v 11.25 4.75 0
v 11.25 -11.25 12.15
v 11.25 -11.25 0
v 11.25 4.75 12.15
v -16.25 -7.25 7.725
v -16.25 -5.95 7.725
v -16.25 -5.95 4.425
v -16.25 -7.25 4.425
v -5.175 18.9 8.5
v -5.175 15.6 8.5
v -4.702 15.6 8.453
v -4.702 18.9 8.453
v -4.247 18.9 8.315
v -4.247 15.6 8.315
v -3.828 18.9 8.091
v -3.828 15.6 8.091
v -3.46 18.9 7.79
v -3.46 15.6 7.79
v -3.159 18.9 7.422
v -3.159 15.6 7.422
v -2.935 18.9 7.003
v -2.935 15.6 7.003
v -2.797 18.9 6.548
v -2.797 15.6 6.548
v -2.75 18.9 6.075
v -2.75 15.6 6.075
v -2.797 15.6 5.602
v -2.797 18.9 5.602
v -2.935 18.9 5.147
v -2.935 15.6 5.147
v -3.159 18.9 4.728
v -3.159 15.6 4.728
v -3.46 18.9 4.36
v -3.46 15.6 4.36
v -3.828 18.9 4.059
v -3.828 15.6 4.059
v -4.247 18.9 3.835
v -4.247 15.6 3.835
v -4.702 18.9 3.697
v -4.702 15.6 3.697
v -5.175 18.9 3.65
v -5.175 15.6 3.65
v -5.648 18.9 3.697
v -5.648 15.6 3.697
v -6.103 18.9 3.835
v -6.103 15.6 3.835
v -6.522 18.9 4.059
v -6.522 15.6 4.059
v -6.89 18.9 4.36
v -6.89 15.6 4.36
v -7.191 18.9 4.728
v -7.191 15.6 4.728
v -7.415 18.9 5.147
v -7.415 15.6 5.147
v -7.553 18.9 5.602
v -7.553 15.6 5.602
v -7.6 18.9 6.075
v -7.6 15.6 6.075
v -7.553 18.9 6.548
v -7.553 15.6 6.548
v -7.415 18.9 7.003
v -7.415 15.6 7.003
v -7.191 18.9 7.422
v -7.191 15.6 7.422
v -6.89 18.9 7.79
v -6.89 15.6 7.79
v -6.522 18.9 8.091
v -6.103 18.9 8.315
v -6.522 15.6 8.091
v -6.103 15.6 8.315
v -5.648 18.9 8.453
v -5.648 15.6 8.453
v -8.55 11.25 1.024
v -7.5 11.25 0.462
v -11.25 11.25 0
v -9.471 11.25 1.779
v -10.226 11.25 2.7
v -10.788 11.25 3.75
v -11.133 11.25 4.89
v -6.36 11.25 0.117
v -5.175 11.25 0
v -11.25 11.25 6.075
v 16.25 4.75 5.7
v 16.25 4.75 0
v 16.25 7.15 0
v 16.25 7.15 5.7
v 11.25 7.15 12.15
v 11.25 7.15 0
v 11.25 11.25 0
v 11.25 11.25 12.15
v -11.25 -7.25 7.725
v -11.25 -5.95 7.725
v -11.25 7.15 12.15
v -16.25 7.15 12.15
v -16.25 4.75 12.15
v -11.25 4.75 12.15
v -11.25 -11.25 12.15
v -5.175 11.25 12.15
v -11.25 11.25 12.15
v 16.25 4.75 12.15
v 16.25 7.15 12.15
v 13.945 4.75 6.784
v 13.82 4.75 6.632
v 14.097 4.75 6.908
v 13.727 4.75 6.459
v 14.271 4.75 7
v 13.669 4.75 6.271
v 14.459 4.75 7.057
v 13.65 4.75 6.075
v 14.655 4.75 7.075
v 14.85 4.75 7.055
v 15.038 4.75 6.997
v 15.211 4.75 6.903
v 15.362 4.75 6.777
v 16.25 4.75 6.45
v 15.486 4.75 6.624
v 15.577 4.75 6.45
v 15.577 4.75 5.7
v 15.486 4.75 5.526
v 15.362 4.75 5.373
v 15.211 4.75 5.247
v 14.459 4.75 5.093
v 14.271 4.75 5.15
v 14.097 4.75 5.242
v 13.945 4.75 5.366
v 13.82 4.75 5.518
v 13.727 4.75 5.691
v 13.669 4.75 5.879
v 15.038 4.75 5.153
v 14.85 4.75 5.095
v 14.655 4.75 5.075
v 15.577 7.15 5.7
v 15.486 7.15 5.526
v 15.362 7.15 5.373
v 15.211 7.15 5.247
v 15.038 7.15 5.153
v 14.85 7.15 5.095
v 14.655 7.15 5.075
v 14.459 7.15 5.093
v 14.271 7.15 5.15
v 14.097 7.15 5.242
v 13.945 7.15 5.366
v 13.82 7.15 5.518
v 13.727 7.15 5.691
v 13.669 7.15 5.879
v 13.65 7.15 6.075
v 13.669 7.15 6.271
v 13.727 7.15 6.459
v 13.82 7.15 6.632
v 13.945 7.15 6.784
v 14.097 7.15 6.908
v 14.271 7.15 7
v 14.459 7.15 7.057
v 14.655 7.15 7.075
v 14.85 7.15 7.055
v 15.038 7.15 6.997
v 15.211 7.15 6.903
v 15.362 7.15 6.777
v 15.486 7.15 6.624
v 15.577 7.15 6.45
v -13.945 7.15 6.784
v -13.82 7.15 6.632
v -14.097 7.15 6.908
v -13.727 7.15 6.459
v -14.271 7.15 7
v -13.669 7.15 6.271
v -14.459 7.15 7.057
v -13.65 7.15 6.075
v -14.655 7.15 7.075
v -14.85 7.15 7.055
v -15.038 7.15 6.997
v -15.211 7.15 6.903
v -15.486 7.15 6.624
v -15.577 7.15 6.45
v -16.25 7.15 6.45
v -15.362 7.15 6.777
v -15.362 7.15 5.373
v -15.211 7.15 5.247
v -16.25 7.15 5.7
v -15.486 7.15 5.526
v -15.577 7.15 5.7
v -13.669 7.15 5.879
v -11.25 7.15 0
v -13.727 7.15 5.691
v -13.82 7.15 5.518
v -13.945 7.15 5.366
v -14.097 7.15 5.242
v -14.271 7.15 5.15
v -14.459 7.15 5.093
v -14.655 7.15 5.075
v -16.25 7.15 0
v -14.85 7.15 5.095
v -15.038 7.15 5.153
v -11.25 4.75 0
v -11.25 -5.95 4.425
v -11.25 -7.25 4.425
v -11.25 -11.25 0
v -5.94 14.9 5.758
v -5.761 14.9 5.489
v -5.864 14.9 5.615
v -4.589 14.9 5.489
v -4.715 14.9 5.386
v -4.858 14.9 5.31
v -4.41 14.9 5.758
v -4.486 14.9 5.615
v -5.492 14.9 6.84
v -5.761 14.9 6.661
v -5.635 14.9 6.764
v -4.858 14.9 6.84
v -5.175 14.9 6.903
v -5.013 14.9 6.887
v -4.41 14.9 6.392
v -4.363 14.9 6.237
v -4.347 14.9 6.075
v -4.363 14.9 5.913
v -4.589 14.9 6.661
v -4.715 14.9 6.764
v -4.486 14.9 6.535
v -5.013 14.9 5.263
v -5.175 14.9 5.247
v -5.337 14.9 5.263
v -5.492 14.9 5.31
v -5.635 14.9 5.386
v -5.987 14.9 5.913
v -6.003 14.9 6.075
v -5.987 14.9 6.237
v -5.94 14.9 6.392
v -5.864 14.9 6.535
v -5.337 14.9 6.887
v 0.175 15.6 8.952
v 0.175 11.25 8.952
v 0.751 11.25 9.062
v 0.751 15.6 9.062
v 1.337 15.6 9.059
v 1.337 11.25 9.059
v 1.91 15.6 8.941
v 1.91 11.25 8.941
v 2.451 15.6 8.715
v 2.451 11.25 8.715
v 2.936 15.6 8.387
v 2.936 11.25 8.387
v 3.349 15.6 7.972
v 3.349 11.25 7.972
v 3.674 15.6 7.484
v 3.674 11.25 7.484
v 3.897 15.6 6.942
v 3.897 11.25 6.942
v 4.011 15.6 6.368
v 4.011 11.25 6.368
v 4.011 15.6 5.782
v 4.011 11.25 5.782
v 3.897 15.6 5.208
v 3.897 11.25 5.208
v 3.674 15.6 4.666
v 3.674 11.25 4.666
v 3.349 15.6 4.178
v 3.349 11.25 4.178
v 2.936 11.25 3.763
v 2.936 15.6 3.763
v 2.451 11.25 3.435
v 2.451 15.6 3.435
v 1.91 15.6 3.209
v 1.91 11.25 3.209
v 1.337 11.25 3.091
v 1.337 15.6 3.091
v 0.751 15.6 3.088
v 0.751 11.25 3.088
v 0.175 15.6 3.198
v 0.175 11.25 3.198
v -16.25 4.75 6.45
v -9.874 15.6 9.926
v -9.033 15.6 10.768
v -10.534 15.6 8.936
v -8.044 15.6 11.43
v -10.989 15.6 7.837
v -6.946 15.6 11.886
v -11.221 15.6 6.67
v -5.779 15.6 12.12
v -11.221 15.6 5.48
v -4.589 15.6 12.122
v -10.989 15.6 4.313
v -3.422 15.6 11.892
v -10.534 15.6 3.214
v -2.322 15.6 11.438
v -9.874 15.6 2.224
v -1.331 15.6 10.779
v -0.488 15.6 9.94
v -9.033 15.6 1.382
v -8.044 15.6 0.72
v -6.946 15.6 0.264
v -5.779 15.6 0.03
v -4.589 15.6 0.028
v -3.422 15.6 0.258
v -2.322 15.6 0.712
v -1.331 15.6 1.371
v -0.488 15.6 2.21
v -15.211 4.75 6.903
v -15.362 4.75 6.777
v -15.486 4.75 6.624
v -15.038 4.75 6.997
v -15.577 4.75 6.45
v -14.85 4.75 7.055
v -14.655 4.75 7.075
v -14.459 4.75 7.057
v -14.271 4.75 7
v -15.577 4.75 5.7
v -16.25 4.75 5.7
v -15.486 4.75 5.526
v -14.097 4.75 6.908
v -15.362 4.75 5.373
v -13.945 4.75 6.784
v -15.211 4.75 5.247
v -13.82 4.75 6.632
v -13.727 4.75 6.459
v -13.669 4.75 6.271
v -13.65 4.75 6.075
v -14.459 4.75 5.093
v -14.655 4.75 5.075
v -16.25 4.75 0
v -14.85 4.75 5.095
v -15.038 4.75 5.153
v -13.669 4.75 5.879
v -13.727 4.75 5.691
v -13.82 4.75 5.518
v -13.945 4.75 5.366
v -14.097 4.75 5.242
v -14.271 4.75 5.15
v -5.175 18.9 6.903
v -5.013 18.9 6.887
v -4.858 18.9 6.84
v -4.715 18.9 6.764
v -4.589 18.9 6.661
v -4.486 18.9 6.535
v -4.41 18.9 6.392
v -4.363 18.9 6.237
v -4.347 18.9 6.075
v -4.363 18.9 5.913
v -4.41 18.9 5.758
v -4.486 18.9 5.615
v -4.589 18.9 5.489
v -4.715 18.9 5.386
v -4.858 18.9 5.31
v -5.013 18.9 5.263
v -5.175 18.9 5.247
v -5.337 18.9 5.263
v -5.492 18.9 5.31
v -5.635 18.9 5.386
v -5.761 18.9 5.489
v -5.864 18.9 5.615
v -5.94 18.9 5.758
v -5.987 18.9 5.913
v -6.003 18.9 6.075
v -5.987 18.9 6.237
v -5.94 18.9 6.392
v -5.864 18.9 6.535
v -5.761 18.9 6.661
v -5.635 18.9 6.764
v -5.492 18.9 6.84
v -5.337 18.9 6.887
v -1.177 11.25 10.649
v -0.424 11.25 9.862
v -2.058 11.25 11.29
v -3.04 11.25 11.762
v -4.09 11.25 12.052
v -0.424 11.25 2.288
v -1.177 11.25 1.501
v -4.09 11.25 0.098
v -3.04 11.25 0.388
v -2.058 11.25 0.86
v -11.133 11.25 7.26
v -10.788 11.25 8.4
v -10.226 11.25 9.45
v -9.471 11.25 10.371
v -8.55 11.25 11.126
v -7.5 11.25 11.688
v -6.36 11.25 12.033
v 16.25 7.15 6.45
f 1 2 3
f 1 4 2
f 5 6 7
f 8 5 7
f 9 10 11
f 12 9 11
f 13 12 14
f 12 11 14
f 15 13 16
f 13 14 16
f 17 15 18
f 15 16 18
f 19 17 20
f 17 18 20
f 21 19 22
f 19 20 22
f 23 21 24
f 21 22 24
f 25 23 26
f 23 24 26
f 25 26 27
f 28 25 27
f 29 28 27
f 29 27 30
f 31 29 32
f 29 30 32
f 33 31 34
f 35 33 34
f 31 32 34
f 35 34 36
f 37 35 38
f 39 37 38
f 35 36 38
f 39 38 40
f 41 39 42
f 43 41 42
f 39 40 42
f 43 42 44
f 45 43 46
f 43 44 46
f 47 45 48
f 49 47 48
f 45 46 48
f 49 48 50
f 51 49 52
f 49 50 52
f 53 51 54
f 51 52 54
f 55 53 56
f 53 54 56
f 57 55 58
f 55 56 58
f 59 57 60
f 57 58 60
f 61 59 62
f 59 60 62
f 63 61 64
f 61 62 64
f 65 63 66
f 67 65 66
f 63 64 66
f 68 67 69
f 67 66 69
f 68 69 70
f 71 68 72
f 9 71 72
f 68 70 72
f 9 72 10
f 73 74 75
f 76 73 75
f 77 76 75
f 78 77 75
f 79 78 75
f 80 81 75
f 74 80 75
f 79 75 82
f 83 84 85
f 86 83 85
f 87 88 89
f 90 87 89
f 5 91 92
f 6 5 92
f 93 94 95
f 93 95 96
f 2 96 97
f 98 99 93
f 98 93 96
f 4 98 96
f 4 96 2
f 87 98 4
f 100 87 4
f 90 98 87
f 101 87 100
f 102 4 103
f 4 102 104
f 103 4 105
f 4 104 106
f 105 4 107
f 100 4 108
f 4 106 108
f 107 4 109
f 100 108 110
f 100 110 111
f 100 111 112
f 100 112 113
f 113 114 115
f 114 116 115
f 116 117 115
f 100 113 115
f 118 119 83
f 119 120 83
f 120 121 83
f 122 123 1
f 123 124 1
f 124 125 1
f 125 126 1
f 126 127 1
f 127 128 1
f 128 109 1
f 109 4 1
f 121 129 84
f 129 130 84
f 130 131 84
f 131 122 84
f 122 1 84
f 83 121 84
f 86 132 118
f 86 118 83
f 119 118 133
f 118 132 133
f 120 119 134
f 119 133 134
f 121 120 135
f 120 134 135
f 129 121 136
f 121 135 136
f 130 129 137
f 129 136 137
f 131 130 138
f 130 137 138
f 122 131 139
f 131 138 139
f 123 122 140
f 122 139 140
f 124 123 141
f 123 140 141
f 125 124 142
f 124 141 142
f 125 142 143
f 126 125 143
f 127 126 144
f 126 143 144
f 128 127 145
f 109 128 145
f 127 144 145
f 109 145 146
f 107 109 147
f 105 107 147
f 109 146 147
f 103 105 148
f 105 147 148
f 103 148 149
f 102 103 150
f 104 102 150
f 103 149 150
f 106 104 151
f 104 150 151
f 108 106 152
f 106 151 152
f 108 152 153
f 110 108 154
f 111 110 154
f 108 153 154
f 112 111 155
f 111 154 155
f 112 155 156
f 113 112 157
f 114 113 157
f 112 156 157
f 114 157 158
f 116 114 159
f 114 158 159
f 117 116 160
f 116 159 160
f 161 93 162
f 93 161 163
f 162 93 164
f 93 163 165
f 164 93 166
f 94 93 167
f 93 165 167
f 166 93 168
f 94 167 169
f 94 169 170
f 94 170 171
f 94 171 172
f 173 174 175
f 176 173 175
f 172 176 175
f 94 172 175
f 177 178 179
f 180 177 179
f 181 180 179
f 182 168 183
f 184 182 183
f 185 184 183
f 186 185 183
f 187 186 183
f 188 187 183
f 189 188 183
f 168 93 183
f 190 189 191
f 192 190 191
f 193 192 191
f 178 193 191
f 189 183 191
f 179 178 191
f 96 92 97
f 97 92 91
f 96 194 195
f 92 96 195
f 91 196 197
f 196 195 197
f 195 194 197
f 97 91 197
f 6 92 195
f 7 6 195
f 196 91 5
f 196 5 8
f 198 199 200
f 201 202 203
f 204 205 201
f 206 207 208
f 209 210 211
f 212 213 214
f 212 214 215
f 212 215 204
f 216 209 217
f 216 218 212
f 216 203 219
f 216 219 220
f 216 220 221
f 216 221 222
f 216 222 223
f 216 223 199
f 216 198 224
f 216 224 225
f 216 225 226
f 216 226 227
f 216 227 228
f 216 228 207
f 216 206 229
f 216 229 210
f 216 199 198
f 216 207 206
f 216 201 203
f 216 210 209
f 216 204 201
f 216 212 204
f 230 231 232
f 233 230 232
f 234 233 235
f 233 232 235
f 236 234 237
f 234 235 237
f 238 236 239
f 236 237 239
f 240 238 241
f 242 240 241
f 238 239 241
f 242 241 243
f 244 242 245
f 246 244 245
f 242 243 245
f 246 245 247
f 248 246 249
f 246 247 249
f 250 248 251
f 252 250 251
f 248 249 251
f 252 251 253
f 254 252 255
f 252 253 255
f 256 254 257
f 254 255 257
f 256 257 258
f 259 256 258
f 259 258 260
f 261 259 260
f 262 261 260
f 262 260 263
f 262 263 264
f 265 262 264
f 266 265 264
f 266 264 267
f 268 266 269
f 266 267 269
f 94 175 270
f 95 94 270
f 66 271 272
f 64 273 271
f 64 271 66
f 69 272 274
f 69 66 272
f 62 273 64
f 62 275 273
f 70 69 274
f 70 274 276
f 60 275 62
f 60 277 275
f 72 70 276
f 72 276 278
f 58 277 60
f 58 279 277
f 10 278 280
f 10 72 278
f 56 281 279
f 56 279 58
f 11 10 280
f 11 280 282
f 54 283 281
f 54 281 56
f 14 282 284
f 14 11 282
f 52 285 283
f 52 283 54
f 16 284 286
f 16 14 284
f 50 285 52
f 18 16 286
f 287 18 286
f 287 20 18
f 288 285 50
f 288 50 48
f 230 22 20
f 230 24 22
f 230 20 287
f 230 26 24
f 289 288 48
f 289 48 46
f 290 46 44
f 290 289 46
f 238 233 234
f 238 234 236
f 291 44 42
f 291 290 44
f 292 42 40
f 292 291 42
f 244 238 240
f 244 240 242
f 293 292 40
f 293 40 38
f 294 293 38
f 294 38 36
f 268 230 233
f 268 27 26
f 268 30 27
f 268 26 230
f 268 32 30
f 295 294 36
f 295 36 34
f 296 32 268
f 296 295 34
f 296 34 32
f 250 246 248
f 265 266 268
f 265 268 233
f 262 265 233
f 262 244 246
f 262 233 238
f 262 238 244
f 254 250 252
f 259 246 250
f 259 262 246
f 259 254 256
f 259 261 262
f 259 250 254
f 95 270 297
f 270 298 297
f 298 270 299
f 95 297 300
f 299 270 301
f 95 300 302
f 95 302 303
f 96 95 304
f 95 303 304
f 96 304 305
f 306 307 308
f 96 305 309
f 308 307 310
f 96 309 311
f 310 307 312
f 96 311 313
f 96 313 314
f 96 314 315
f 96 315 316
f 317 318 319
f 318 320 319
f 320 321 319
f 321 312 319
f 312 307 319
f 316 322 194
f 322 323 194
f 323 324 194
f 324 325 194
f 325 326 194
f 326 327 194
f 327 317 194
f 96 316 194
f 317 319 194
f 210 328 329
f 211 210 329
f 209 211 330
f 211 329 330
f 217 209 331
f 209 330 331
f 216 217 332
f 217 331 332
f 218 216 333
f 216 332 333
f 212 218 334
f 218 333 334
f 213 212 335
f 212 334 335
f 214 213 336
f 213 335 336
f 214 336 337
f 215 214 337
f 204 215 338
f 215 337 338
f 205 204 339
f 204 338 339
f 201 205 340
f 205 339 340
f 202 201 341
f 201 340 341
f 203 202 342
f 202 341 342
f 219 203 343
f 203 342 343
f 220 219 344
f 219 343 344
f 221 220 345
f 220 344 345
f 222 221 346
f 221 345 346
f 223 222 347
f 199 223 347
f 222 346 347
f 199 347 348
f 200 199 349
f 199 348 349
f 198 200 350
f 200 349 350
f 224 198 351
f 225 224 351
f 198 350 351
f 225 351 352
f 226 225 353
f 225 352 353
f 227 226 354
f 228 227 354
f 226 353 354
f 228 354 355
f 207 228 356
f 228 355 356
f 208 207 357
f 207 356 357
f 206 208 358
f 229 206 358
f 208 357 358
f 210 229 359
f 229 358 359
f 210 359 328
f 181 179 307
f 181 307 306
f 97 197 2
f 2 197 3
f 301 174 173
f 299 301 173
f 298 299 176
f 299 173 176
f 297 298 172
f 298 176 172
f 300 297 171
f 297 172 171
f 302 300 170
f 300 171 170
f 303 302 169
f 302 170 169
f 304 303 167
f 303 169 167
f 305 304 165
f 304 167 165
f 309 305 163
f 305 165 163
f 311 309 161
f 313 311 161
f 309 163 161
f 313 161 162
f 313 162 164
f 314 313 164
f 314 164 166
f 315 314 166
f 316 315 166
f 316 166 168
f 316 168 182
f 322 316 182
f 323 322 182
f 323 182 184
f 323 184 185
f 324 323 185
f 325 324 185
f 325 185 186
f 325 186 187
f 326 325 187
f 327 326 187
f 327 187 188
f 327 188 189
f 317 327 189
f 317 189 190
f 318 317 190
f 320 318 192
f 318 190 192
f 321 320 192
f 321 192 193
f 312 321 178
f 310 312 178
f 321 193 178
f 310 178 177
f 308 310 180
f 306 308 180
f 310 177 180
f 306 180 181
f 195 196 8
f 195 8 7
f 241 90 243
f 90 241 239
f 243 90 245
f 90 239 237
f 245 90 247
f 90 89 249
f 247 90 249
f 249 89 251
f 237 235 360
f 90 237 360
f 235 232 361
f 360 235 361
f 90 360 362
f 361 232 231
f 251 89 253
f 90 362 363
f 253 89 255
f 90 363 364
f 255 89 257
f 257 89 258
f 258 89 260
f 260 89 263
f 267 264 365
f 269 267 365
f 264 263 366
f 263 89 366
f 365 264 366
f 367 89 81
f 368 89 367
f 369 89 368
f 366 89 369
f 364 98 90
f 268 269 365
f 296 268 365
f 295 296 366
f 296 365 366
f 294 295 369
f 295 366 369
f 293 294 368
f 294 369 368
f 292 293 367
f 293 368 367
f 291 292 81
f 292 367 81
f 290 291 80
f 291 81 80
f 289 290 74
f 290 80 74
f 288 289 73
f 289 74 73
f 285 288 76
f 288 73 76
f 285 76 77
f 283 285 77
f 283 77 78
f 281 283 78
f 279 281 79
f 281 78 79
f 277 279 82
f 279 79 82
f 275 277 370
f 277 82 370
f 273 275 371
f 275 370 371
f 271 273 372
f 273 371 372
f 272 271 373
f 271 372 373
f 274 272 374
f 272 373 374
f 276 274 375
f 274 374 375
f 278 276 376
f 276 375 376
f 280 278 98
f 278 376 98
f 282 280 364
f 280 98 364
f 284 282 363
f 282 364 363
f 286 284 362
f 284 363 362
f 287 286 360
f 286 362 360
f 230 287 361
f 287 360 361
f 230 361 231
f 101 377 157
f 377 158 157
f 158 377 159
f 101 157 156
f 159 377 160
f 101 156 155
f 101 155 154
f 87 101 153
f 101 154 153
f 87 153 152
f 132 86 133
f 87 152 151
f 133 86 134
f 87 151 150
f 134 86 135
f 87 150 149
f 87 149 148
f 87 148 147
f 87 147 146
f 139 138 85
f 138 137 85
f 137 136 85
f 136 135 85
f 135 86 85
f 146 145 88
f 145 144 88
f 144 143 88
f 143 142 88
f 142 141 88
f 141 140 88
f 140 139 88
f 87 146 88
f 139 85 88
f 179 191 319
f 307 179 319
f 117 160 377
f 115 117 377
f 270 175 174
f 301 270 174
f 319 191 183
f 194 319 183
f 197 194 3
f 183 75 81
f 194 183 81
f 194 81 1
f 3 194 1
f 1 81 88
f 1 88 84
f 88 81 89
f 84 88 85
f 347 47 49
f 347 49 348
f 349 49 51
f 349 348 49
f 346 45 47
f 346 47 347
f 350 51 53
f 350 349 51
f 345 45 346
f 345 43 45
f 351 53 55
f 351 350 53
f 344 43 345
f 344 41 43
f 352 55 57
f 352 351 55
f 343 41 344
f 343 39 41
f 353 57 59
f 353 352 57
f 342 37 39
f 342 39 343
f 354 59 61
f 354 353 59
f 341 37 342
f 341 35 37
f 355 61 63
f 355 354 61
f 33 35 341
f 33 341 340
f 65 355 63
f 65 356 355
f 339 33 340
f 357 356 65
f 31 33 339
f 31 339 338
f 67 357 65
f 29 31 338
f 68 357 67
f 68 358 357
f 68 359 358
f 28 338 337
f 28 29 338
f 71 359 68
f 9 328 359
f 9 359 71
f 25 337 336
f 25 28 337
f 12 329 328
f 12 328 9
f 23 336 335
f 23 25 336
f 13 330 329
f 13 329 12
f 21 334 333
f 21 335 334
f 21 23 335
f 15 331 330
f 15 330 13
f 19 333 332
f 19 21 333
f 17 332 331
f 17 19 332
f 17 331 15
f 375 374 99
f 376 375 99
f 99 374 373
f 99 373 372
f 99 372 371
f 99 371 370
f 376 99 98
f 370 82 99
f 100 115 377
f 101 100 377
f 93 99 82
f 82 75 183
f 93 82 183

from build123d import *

# Parameters (mm, degrees)
BOSS_EXTRUDE1_DEPTH = 12.15
BOSS_EXTRUDE2_DEPTH = 4.35
SKETCH5_R           = 2.425
BOSS_EXTRUDE3_DEPTH = 3.3
SKETCH6_R           = 0.828221189
CUT_EXTRUDE3_DEPTH  = 4
SKETCH8_R           = 1
CUT_EXTRUDE4_DEPTH  = 5
SKETCH9_W           = 2.165756054
SKETCH9_H           = 0.75
SKETCH9_W_2         = 1.729877666
CUT_EXTRUDE5_DEPTH  = 5
SKETCH10_W          = 3.3
SKETCH10_H          = 1.3
BOSS_EXTRUDE6_DEPTH = 27.5


with BuildPart() as part:
    # Sketch1 → Boss-Extrude1 (new body)
    with BuildSketch(Plane.XY):
        Polygon((-11.25, -11.25), (11.25, -11.25), (11.25, 4.75), (16.25, 4.75), (16.25, 7.15), (11.25, 7.15), (11.25, 11.25), (-11.25, 11.25), (-11.25, 7.15), (-16.25, 7.15), (-16.25, 4.75), (-11.25, 4.75), align=None)
    extrude(amount=BOSS_EXTRUDE1_DEPTH)

    # Sketch4 → Boss-Extrude2 (add)
    with BuildSketch(Plane(origin=(0, 11.25, 0), x_dir=(1, 0, 0), z_dir=(0, 1, 0))):
        with BuildLine():
            ThreePointArc((0.175453629, -3.197801543), (-11.25, -6.075), (0.175453629, -8.952198457))
            ThreePointArc((0.175453629, -8.952198457), (4.025, -6.075), (0.175453629, -3.197801543))
        make_face()
    extrude(amount=BOSS_EXTRUDE2_DEPTH)

    # Sketch5 → Boss-Extrude3 (add)
    with BuildSketch(Plane(origin=(0, 15.6, 0), x_dir=(1, 0, 0), z_dir=(0, 1, 0))):
        with Locations(Location((-5.175, -6.075, 0), (0, 0, 270))):
            Circle(SKETCH5_R)
    extrude(amount=BOSS_EXTRUDE3_DEPTH)

    # Sketch6 → Cut-Extrude3 (cut)
    with BuildSketch(Plane(origin=(0, 18.9, 0), x_dir=(1, 0, 0), z_dir=(0, 1, 0))):
        with Locations(Location((-5.175, -6.075, 0), (0, 0, 270))):
            Circle(SKETCH6_R)
    extrude(amount=-CUT_EXTRUDE3_DEPTH, mode=Mode.SUBTRACT)

    # Sketch8 → Cut-Extrude4 (cut)
    with BuildSketch(Plane(origin=(0, 7.15, 0), x_dir=(1, 0, 0), z_dir=(0, 1, 0))):
        with Locations(Location((-14.65, -6.075, 0), (0, 0, 180))):
            Circle(SKETCH8_R)
        with Locations(Location((14.65, -6.075, 0), (0, 0, 180))):
            Circle(SKETCH8_R)
    extrude(amount=-CUT_EXTRUDE4_DEPTH, mode=Mode.SUBTRACT)

    # Sketch9 → Cut-Extrude5 (cut)
    with BuildSketch(Plane(origin=(0, 7.15, 0), x_dir=(1, 0, 0), z_dir=(0, 1, 0))):
        with Locations((-16.153079265, -6.075)):
            Rectangle(SKETCH9_W, SKETCH9_H)
        with Locations((16.036741918, -6.075)):
            Rectangle(SKETCH9_W_2, SKETCH9_H)
    extrude(amount=-CUT_EXTRUDE5_DEPTH, mode=Mode.SUBTRACT)

    # Sketch10 → Boss-Extrude6 (add)
    with BuildSketch(Plane(origin=(11.25, 0, 0), x_dir=(0, 0, -1), z_dir=(1, 0, 0))):
        with Locations((-6.075, -6.6)):
            Rectangle(SKETCH10_W, SKETCH10_H)
    extrude(amount=-BOSS_EXTRUDE6_DEPTH)


solid = part.part
